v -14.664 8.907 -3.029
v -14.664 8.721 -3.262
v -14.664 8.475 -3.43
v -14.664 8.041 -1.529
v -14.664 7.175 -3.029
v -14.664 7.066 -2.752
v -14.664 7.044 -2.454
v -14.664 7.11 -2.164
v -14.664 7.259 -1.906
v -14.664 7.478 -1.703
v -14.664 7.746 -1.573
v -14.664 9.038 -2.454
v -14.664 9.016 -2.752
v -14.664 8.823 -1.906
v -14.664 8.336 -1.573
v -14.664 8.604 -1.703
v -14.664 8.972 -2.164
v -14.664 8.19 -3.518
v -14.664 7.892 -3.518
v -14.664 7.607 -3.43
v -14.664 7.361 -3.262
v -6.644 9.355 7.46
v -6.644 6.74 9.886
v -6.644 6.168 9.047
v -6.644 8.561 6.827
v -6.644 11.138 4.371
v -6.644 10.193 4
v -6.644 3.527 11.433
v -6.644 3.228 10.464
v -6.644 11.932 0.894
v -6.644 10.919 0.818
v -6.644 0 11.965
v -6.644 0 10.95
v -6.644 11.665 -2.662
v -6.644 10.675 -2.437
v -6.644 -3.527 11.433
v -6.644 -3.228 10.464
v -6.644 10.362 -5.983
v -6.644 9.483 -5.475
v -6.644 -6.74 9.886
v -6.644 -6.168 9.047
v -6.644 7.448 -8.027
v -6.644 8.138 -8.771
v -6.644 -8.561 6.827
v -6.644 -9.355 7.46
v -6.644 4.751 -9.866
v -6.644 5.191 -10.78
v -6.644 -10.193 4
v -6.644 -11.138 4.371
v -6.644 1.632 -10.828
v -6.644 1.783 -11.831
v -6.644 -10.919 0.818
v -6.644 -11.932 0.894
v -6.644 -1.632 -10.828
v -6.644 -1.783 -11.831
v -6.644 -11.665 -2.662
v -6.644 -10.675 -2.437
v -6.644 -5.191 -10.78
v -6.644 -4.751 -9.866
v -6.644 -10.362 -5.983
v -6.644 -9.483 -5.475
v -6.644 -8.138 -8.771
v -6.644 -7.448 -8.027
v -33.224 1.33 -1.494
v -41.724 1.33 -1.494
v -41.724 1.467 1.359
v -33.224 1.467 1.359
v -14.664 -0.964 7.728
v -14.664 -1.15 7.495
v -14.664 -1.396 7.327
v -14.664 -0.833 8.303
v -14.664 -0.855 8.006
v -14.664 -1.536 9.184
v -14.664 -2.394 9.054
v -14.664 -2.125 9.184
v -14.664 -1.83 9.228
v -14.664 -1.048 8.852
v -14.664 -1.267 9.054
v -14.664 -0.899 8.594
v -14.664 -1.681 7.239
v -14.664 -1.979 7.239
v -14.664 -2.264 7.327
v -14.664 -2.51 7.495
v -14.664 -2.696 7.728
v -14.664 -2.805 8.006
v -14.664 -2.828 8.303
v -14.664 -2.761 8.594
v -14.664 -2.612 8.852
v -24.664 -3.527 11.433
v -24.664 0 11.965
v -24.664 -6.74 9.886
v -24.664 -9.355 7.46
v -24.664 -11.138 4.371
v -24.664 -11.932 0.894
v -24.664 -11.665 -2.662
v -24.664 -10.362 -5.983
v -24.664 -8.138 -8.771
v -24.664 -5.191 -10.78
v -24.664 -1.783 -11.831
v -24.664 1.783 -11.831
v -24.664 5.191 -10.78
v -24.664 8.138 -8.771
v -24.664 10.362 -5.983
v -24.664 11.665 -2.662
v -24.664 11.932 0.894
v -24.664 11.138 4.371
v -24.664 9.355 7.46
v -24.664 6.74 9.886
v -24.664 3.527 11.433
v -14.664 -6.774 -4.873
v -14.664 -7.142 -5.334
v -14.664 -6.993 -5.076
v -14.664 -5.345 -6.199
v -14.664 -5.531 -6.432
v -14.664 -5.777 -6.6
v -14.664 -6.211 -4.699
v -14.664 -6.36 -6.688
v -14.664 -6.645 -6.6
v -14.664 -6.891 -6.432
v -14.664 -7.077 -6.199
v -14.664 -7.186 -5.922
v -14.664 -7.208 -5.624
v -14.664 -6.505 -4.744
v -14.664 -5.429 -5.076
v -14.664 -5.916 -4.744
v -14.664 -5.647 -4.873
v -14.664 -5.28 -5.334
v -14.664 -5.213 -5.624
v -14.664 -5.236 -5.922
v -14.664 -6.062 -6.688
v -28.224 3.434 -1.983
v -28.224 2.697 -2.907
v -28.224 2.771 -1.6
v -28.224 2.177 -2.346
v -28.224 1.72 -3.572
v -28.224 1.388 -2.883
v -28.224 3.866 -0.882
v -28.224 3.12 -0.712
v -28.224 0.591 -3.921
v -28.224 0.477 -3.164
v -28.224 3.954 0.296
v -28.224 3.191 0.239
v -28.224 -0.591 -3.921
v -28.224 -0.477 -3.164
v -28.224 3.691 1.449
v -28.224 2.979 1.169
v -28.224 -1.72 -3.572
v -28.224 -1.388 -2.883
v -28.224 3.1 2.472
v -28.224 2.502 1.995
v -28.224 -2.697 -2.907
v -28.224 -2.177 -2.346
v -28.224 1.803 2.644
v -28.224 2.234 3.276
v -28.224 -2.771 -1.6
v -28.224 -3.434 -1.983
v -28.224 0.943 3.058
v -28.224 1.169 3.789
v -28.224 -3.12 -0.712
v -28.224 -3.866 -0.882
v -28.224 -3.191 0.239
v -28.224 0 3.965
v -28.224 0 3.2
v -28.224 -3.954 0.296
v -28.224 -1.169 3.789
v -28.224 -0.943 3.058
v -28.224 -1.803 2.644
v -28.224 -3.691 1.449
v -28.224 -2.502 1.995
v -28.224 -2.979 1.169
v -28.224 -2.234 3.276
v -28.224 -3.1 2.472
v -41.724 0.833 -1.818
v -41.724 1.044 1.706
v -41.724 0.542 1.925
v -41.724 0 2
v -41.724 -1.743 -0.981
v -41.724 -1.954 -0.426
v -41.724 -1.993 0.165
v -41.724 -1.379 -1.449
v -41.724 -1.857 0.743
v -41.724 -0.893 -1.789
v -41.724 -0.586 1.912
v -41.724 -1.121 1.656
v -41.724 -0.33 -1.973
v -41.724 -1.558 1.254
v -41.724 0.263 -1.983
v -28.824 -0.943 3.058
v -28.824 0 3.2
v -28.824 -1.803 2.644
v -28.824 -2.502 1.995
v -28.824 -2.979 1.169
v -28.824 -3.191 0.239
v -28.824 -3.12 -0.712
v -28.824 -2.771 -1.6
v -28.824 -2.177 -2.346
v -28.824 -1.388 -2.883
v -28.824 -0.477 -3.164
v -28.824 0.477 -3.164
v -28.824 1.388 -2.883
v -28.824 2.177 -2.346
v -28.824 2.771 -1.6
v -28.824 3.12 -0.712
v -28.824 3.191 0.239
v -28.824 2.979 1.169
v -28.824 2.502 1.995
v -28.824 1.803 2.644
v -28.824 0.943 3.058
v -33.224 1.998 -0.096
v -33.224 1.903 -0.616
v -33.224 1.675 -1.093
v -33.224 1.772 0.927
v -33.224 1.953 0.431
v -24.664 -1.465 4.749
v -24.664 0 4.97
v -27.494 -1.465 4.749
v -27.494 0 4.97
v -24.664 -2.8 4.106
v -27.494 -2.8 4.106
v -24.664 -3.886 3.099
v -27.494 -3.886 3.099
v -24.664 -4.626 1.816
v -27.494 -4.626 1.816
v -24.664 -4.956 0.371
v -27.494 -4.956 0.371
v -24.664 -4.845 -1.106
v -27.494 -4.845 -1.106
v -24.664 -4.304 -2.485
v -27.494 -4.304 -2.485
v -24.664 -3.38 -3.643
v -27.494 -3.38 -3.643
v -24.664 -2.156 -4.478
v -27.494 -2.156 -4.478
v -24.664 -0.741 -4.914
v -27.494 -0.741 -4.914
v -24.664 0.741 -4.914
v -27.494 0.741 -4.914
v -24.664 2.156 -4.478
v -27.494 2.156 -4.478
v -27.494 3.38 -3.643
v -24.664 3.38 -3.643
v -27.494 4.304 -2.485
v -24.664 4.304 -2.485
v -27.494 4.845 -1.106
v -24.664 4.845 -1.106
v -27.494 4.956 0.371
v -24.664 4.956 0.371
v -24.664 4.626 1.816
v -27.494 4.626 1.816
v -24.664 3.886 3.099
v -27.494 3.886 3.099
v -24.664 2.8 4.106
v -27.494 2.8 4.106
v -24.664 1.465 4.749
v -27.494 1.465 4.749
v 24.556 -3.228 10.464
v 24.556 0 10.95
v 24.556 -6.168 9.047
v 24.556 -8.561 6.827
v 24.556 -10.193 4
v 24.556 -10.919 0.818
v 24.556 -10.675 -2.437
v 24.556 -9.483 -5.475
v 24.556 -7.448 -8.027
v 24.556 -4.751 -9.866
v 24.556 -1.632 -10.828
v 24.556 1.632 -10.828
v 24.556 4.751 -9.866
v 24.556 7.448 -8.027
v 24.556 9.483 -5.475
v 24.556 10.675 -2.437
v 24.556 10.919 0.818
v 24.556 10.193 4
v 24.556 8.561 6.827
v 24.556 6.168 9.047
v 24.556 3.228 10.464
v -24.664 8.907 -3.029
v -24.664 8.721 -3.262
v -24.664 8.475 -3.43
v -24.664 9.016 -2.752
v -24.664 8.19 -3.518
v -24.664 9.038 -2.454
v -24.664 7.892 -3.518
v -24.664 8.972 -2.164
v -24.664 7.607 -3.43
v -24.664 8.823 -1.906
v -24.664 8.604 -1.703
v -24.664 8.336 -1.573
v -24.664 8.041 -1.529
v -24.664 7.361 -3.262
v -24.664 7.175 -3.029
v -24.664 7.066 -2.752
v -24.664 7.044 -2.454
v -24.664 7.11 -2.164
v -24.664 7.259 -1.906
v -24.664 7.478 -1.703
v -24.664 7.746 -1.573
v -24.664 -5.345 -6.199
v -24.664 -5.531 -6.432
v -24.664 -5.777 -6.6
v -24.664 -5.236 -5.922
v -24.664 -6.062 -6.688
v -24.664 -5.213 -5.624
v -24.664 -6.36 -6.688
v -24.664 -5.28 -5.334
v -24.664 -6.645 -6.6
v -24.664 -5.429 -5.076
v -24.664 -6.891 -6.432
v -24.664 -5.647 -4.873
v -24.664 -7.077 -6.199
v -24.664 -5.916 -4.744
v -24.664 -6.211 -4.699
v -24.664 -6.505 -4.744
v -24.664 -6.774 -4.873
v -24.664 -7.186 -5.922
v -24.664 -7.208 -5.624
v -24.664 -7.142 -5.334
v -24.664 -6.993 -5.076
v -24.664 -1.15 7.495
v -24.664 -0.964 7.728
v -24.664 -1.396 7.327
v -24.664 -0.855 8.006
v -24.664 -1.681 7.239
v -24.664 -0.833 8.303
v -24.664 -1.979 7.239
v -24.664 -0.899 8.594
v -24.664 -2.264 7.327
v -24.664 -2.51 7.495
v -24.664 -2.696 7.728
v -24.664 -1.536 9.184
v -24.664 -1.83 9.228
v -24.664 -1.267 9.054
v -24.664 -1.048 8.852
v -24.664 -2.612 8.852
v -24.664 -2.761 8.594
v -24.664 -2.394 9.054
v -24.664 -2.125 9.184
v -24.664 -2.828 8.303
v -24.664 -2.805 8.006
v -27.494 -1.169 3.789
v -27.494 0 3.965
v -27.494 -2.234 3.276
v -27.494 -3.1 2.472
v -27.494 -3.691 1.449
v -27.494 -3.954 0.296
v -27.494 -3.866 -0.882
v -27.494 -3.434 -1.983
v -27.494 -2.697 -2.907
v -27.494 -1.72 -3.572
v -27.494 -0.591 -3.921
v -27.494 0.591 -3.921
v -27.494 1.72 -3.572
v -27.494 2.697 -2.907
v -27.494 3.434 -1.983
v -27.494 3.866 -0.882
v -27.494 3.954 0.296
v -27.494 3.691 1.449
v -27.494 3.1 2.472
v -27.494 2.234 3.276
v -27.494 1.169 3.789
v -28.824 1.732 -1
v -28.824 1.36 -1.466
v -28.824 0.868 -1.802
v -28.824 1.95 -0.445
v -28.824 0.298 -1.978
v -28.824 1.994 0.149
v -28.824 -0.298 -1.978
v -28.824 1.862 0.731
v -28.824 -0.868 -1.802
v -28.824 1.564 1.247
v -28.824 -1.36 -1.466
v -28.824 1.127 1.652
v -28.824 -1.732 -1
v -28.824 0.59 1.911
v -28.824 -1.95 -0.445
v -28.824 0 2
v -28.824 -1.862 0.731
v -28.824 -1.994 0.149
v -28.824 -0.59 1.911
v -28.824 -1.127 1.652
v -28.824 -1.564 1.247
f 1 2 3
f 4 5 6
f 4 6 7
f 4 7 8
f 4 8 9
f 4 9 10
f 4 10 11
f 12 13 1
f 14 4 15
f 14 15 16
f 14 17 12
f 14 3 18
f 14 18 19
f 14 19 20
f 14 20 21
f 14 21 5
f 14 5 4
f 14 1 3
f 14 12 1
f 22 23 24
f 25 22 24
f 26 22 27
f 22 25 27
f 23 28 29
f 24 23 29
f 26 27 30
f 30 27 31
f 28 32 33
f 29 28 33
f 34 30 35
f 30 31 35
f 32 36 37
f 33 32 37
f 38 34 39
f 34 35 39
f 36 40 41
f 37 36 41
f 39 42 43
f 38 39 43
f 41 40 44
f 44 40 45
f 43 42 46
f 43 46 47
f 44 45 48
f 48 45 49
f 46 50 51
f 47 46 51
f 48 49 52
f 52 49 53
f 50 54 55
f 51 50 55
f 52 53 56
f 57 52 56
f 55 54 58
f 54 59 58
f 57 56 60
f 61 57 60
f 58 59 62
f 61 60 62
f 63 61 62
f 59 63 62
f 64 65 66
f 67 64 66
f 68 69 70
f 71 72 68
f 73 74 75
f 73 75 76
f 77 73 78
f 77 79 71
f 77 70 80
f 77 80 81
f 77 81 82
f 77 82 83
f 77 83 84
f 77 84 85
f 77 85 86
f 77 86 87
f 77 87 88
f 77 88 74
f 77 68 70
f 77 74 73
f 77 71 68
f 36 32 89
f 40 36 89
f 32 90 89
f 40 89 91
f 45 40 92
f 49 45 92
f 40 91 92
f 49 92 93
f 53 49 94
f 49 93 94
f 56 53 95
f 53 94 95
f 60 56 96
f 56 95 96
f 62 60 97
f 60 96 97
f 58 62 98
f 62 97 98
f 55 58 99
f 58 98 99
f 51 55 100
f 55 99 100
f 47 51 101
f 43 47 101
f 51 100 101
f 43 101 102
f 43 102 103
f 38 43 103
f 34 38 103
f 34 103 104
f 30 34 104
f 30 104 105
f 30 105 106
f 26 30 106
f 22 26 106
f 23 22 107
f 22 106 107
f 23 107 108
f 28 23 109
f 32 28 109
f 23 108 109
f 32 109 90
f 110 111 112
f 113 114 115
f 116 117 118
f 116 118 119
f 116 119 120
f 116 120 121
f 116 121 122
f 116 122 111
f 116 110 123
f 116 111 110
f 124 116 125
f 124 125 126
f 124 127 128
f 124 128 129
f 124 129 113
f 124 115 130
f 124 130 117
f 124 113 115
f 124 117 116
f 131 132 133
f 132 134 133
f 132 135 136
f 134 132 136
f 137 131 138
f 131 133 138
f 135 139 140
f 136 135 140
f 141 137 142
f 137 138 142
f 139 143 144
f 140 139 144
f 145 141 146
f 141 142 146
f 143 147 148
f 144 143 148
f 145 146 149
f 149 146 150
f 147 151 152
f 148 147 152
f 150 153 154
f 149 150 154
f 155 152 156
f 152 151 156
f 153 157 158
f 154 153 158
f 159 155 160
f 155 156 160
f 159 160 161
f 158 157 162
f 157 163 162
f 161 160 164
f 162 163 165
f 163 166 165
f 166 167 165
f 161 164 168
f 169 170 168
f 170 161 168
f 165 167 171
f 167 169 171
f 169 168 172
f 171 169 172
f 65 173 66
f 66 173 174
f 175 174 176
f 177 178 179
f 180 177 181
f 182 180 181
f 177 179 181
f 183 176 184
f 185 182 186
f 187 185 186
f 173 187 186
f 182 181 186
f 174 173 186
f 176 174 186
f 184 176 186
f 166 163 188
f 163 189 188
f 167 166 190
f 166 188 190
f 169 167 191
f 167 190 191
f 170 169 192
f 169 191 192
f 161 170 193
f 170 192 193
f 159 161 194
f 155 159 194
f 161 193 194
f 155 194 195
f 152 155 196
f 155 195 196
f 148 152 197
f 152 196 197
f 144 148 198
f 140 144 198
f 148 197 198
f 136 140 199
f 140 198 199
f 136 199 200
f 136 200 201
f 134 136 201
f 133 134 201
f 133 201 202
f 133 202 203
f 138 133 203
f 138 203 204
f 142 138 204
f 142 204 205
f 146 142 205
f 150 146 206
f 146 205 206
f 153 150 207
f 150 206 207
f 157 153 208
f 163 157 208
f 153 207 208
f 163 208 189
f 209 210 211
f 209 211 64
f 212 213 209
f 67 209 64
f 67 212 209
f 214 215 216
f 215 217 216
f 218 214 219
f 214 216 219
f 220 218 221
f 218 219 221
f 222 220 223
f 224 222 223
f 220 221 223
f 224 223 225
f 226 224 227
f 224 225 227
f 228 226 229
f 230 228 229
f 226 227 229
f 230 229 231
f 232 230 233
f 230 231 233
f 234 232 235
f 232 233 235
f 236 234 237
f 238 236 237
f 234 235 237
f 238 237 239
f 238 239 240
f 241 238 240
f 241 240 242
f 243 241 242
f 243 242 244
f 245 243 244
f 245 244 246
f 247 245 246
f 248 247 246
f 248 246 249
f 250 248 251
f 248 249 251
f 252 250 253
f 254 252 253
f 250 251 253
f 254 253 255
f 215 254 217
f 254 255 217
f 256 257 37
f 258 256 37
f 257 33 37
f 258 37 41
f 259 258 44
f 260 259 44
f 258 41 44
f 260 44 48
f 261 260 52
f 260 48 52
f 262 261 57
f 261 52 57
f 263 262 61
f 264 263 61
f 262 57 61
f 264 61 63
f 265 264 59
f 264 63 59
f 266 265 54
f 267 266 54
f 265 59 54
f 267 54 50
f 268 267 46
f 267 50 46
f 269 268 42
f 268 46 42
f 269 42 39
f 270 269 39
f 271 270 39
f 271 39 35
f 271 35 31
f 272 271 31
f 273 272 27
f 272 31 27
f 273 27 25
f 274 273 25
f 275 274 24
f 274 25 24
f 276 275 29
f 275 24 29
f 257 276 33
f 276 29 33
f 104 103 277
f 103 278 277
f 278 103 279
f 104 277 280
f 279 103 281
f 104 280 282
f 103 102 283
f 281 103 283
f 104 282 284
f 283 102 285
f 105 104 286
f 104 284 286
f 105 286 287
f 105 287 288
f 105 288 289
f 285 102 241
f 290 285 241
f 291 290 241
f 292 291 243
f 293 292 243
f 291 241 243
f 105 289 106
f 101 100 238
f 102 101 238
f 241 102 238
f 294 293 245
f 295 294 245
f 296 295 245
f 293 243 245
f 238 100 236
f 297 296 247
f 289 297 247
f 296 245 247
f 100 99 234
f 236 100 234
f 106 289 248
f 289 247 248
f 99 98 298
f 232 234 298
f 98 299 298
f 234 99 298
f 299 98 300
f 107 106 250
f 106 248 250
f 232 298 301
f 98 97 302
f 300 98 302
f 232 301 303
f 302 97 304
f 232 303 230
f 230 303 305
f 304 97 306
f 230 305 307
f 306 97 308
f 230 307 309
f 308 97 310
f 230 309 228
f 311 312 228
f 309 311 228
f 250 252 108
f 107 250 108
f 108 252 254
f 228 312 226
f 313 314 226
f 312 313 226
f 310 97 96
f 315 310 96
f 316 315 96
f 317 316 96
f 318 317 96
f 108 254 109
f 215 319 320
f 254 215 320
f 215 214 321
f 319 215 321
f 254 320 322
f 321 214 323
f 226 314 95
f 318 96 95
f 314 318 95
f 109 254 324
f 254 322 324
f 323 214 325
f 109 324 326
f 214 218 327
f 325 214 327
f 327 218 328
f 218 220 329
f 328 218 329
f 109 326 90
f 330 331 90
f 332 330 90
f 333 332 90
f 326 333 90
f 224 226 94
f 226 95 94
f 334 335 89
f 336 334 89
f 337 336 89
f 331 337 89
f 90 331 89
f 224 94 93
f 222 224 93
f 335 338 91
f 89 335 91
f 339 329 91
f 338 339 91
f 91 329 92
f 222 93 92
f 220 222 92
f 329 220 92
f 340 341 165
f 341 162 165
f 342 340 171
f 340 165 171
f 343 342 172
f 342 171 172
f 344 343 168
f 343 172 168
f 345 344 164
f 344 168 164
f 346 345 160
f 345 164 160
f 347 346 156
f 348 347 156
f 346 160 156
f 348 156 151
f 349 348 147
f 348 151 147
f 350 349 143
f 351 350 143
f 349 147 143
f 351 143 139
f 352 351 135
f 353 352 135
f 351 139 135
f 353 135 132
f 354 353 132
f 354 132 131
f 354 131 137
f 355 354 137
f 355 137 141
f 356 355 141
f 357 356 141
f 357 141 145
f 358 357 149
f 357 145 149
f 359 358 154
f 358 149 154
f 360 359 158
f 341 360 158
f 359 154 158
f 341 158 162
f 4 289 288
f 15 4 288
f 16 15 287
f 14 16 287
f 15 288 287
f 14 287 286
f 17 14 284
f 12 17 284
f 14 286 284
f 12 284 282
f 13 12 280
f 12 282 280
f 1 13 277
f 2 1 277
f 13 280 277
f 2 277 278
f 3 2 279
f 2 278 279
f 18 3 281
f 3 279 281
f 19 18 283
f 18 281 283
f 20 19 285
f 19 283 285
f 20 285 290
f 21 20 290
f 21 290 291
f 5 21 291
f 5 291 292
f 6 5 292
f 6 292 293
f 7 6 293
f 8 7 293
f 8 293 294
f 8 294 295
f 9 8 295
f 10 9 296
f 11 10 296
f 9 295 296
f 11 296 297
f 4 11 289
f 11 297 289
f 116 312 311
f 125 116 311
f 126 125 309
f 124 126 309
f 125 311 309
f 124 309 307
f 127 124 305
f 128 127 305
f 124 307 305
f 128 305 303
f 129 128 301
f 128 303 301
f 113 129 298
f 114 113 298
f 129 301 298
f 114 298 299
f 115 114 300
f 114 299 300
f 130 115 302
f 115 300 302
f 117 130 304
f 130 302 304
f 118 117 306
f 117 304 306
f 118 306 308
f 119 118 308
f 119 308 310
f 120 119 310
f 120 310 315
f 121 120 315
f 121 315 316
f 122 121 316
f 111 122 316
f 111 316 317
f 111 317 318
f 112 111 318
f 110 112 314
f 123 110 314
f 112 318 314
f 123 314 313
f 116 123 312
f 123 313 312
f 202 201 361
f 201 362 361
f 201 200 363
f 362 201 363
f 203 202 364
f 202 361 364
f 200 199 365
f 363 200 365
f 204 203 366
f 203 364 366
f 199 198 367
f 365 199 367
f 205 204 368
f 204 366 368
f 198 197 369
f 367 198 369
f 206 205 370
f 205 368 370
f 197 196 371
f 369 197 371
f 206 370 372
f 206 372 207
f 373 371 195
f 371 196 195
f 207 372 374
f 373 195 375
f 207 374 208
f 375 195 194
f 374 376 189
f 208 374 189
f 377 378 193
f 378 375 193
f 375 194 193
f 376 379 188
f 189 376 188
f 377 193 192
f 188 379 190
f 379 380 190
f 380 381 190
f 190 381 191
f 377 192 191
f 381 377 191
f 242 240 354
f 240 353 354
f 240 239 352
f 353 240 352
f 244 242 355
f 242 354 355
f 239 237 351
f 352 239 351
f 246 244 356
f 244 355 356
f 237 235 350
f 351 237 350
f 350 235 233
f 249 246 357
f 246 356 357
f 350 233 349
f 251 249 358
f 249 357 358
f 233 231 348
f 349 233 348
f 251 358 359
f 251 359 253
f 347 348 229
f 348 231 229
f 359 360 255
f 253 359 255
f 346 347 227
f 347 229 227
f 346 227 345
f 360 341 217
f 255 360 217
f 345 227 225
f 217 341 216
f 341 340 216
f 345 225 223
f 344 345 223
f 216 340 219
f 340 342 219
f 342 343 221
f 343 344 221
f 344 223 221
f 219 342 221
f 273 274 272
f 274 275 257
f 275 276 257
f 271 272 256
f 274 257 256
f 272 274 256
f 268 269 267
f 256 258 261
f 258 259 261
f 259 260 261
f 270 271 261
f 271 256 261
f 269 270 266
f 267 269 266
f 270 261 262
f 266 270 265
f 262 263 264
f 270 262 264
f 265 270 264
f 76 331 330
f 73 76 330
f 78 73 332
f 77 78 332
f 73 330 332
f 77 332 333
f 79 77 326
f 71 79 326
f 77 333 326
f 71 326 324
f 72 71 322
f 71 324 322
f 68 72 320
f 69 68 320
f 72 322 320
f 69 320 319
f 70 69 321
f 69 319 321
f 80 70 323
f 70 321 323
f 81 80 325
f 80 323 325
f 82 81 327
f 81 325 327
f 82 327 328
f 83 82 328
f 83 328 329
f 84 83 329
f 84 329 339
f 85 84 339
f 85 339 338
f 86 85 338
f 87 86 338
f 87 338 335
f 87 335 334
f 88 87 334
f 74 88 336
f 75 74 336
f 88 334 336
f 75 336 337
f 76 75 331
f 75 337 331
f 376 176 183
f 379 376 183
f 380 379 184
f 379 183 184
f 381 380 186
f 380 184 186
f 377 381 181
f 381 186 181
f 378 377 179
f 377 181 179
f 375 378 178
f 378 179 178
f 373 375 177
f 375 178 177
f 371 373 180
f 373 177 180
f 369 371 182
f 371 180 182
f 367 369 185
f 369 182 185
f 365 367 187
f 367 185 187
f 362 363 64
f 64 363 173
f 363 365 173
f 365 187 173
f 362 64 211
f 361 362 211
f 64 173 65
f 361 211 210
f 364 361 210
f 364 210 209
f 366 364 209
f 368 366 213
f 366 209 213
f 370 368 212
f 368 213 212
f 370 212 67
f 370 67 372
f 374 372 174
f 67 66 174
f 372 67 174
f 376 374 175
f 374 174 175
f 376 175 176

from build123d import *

# Parameters (mm, degrees)
CUT_EXTRUDE1_DEPTH = 8.5
SKETCH4_R          = 1
CUT_EXTRUDE2_DEPTH = 10


with BuildPart() as part:
    # Sketch2 → Revolve1 (revolve)
    with BuildSketch(Plane(origin=(0, 0, 0), x_dir=(1, 0, 0), z_dir=(0, 1, 0)), mode=Mode.PRIVATE) as revolve1_sk:
        Polygon((-41.724352159, 0), (24.555647841, 0), (24.555647841, 10.95), (-6.644352159, 10.95), (-6.644352159, 11.965), (-24.664352159, 11.965), (-24.664352159, 4.97), (-27.494352159, 4.97), (-27.494352159, 3.965), (-28.224352159, 3.965), (-28.224352159, 3.2), (-28.824352159, 3.2), (-28.824352159, 2), (-41.724352159, 2), align=None)
    revolve(revolve1_sk.sketch.rotate(Axis((-41.724352159, 0, 0), (1, 0, 0)), 180), axis=Axis((-41.724352159, 0, 0), (1, 0, 0)))

    # Sketch3 → Cut-Extrude1 (cut)
    with BuildSketch(Plane.ZY.offset(41.724352159)):
        with BuildLine():
            Line((-1.493929209, 1.329727611), (1.359340223, 1.467035841))
            ThreePointArc((1.359340223, 1.467035841), (-0.096134989, 1.99768818), (-1.493929209, 1.329727611))
        make_face()
    extrude(amount=-CUT_EXTRUDE1_DEPTH, mode=Mode.SUBTRACT)

    # Sketch4 → Cut-Extrude2 (cut)
    with BuildSketch(Plane.ZY.offset(24.664352159)):
        with Locations((-2.529015446, 8.04098341)):
            Circle(SKETCH4_R)
        with Locations((-5.699188182, -6.210683328)):
            Circle(SKETCH4_R)
        with Locations((8.228203628, -1.830300082)):
            Circle(SKETCH4_R)
    extrude(amount=-CUT_EXTRUDE2_DEPTH, mode=Mode.SUBTRACT)


solid = part.part
